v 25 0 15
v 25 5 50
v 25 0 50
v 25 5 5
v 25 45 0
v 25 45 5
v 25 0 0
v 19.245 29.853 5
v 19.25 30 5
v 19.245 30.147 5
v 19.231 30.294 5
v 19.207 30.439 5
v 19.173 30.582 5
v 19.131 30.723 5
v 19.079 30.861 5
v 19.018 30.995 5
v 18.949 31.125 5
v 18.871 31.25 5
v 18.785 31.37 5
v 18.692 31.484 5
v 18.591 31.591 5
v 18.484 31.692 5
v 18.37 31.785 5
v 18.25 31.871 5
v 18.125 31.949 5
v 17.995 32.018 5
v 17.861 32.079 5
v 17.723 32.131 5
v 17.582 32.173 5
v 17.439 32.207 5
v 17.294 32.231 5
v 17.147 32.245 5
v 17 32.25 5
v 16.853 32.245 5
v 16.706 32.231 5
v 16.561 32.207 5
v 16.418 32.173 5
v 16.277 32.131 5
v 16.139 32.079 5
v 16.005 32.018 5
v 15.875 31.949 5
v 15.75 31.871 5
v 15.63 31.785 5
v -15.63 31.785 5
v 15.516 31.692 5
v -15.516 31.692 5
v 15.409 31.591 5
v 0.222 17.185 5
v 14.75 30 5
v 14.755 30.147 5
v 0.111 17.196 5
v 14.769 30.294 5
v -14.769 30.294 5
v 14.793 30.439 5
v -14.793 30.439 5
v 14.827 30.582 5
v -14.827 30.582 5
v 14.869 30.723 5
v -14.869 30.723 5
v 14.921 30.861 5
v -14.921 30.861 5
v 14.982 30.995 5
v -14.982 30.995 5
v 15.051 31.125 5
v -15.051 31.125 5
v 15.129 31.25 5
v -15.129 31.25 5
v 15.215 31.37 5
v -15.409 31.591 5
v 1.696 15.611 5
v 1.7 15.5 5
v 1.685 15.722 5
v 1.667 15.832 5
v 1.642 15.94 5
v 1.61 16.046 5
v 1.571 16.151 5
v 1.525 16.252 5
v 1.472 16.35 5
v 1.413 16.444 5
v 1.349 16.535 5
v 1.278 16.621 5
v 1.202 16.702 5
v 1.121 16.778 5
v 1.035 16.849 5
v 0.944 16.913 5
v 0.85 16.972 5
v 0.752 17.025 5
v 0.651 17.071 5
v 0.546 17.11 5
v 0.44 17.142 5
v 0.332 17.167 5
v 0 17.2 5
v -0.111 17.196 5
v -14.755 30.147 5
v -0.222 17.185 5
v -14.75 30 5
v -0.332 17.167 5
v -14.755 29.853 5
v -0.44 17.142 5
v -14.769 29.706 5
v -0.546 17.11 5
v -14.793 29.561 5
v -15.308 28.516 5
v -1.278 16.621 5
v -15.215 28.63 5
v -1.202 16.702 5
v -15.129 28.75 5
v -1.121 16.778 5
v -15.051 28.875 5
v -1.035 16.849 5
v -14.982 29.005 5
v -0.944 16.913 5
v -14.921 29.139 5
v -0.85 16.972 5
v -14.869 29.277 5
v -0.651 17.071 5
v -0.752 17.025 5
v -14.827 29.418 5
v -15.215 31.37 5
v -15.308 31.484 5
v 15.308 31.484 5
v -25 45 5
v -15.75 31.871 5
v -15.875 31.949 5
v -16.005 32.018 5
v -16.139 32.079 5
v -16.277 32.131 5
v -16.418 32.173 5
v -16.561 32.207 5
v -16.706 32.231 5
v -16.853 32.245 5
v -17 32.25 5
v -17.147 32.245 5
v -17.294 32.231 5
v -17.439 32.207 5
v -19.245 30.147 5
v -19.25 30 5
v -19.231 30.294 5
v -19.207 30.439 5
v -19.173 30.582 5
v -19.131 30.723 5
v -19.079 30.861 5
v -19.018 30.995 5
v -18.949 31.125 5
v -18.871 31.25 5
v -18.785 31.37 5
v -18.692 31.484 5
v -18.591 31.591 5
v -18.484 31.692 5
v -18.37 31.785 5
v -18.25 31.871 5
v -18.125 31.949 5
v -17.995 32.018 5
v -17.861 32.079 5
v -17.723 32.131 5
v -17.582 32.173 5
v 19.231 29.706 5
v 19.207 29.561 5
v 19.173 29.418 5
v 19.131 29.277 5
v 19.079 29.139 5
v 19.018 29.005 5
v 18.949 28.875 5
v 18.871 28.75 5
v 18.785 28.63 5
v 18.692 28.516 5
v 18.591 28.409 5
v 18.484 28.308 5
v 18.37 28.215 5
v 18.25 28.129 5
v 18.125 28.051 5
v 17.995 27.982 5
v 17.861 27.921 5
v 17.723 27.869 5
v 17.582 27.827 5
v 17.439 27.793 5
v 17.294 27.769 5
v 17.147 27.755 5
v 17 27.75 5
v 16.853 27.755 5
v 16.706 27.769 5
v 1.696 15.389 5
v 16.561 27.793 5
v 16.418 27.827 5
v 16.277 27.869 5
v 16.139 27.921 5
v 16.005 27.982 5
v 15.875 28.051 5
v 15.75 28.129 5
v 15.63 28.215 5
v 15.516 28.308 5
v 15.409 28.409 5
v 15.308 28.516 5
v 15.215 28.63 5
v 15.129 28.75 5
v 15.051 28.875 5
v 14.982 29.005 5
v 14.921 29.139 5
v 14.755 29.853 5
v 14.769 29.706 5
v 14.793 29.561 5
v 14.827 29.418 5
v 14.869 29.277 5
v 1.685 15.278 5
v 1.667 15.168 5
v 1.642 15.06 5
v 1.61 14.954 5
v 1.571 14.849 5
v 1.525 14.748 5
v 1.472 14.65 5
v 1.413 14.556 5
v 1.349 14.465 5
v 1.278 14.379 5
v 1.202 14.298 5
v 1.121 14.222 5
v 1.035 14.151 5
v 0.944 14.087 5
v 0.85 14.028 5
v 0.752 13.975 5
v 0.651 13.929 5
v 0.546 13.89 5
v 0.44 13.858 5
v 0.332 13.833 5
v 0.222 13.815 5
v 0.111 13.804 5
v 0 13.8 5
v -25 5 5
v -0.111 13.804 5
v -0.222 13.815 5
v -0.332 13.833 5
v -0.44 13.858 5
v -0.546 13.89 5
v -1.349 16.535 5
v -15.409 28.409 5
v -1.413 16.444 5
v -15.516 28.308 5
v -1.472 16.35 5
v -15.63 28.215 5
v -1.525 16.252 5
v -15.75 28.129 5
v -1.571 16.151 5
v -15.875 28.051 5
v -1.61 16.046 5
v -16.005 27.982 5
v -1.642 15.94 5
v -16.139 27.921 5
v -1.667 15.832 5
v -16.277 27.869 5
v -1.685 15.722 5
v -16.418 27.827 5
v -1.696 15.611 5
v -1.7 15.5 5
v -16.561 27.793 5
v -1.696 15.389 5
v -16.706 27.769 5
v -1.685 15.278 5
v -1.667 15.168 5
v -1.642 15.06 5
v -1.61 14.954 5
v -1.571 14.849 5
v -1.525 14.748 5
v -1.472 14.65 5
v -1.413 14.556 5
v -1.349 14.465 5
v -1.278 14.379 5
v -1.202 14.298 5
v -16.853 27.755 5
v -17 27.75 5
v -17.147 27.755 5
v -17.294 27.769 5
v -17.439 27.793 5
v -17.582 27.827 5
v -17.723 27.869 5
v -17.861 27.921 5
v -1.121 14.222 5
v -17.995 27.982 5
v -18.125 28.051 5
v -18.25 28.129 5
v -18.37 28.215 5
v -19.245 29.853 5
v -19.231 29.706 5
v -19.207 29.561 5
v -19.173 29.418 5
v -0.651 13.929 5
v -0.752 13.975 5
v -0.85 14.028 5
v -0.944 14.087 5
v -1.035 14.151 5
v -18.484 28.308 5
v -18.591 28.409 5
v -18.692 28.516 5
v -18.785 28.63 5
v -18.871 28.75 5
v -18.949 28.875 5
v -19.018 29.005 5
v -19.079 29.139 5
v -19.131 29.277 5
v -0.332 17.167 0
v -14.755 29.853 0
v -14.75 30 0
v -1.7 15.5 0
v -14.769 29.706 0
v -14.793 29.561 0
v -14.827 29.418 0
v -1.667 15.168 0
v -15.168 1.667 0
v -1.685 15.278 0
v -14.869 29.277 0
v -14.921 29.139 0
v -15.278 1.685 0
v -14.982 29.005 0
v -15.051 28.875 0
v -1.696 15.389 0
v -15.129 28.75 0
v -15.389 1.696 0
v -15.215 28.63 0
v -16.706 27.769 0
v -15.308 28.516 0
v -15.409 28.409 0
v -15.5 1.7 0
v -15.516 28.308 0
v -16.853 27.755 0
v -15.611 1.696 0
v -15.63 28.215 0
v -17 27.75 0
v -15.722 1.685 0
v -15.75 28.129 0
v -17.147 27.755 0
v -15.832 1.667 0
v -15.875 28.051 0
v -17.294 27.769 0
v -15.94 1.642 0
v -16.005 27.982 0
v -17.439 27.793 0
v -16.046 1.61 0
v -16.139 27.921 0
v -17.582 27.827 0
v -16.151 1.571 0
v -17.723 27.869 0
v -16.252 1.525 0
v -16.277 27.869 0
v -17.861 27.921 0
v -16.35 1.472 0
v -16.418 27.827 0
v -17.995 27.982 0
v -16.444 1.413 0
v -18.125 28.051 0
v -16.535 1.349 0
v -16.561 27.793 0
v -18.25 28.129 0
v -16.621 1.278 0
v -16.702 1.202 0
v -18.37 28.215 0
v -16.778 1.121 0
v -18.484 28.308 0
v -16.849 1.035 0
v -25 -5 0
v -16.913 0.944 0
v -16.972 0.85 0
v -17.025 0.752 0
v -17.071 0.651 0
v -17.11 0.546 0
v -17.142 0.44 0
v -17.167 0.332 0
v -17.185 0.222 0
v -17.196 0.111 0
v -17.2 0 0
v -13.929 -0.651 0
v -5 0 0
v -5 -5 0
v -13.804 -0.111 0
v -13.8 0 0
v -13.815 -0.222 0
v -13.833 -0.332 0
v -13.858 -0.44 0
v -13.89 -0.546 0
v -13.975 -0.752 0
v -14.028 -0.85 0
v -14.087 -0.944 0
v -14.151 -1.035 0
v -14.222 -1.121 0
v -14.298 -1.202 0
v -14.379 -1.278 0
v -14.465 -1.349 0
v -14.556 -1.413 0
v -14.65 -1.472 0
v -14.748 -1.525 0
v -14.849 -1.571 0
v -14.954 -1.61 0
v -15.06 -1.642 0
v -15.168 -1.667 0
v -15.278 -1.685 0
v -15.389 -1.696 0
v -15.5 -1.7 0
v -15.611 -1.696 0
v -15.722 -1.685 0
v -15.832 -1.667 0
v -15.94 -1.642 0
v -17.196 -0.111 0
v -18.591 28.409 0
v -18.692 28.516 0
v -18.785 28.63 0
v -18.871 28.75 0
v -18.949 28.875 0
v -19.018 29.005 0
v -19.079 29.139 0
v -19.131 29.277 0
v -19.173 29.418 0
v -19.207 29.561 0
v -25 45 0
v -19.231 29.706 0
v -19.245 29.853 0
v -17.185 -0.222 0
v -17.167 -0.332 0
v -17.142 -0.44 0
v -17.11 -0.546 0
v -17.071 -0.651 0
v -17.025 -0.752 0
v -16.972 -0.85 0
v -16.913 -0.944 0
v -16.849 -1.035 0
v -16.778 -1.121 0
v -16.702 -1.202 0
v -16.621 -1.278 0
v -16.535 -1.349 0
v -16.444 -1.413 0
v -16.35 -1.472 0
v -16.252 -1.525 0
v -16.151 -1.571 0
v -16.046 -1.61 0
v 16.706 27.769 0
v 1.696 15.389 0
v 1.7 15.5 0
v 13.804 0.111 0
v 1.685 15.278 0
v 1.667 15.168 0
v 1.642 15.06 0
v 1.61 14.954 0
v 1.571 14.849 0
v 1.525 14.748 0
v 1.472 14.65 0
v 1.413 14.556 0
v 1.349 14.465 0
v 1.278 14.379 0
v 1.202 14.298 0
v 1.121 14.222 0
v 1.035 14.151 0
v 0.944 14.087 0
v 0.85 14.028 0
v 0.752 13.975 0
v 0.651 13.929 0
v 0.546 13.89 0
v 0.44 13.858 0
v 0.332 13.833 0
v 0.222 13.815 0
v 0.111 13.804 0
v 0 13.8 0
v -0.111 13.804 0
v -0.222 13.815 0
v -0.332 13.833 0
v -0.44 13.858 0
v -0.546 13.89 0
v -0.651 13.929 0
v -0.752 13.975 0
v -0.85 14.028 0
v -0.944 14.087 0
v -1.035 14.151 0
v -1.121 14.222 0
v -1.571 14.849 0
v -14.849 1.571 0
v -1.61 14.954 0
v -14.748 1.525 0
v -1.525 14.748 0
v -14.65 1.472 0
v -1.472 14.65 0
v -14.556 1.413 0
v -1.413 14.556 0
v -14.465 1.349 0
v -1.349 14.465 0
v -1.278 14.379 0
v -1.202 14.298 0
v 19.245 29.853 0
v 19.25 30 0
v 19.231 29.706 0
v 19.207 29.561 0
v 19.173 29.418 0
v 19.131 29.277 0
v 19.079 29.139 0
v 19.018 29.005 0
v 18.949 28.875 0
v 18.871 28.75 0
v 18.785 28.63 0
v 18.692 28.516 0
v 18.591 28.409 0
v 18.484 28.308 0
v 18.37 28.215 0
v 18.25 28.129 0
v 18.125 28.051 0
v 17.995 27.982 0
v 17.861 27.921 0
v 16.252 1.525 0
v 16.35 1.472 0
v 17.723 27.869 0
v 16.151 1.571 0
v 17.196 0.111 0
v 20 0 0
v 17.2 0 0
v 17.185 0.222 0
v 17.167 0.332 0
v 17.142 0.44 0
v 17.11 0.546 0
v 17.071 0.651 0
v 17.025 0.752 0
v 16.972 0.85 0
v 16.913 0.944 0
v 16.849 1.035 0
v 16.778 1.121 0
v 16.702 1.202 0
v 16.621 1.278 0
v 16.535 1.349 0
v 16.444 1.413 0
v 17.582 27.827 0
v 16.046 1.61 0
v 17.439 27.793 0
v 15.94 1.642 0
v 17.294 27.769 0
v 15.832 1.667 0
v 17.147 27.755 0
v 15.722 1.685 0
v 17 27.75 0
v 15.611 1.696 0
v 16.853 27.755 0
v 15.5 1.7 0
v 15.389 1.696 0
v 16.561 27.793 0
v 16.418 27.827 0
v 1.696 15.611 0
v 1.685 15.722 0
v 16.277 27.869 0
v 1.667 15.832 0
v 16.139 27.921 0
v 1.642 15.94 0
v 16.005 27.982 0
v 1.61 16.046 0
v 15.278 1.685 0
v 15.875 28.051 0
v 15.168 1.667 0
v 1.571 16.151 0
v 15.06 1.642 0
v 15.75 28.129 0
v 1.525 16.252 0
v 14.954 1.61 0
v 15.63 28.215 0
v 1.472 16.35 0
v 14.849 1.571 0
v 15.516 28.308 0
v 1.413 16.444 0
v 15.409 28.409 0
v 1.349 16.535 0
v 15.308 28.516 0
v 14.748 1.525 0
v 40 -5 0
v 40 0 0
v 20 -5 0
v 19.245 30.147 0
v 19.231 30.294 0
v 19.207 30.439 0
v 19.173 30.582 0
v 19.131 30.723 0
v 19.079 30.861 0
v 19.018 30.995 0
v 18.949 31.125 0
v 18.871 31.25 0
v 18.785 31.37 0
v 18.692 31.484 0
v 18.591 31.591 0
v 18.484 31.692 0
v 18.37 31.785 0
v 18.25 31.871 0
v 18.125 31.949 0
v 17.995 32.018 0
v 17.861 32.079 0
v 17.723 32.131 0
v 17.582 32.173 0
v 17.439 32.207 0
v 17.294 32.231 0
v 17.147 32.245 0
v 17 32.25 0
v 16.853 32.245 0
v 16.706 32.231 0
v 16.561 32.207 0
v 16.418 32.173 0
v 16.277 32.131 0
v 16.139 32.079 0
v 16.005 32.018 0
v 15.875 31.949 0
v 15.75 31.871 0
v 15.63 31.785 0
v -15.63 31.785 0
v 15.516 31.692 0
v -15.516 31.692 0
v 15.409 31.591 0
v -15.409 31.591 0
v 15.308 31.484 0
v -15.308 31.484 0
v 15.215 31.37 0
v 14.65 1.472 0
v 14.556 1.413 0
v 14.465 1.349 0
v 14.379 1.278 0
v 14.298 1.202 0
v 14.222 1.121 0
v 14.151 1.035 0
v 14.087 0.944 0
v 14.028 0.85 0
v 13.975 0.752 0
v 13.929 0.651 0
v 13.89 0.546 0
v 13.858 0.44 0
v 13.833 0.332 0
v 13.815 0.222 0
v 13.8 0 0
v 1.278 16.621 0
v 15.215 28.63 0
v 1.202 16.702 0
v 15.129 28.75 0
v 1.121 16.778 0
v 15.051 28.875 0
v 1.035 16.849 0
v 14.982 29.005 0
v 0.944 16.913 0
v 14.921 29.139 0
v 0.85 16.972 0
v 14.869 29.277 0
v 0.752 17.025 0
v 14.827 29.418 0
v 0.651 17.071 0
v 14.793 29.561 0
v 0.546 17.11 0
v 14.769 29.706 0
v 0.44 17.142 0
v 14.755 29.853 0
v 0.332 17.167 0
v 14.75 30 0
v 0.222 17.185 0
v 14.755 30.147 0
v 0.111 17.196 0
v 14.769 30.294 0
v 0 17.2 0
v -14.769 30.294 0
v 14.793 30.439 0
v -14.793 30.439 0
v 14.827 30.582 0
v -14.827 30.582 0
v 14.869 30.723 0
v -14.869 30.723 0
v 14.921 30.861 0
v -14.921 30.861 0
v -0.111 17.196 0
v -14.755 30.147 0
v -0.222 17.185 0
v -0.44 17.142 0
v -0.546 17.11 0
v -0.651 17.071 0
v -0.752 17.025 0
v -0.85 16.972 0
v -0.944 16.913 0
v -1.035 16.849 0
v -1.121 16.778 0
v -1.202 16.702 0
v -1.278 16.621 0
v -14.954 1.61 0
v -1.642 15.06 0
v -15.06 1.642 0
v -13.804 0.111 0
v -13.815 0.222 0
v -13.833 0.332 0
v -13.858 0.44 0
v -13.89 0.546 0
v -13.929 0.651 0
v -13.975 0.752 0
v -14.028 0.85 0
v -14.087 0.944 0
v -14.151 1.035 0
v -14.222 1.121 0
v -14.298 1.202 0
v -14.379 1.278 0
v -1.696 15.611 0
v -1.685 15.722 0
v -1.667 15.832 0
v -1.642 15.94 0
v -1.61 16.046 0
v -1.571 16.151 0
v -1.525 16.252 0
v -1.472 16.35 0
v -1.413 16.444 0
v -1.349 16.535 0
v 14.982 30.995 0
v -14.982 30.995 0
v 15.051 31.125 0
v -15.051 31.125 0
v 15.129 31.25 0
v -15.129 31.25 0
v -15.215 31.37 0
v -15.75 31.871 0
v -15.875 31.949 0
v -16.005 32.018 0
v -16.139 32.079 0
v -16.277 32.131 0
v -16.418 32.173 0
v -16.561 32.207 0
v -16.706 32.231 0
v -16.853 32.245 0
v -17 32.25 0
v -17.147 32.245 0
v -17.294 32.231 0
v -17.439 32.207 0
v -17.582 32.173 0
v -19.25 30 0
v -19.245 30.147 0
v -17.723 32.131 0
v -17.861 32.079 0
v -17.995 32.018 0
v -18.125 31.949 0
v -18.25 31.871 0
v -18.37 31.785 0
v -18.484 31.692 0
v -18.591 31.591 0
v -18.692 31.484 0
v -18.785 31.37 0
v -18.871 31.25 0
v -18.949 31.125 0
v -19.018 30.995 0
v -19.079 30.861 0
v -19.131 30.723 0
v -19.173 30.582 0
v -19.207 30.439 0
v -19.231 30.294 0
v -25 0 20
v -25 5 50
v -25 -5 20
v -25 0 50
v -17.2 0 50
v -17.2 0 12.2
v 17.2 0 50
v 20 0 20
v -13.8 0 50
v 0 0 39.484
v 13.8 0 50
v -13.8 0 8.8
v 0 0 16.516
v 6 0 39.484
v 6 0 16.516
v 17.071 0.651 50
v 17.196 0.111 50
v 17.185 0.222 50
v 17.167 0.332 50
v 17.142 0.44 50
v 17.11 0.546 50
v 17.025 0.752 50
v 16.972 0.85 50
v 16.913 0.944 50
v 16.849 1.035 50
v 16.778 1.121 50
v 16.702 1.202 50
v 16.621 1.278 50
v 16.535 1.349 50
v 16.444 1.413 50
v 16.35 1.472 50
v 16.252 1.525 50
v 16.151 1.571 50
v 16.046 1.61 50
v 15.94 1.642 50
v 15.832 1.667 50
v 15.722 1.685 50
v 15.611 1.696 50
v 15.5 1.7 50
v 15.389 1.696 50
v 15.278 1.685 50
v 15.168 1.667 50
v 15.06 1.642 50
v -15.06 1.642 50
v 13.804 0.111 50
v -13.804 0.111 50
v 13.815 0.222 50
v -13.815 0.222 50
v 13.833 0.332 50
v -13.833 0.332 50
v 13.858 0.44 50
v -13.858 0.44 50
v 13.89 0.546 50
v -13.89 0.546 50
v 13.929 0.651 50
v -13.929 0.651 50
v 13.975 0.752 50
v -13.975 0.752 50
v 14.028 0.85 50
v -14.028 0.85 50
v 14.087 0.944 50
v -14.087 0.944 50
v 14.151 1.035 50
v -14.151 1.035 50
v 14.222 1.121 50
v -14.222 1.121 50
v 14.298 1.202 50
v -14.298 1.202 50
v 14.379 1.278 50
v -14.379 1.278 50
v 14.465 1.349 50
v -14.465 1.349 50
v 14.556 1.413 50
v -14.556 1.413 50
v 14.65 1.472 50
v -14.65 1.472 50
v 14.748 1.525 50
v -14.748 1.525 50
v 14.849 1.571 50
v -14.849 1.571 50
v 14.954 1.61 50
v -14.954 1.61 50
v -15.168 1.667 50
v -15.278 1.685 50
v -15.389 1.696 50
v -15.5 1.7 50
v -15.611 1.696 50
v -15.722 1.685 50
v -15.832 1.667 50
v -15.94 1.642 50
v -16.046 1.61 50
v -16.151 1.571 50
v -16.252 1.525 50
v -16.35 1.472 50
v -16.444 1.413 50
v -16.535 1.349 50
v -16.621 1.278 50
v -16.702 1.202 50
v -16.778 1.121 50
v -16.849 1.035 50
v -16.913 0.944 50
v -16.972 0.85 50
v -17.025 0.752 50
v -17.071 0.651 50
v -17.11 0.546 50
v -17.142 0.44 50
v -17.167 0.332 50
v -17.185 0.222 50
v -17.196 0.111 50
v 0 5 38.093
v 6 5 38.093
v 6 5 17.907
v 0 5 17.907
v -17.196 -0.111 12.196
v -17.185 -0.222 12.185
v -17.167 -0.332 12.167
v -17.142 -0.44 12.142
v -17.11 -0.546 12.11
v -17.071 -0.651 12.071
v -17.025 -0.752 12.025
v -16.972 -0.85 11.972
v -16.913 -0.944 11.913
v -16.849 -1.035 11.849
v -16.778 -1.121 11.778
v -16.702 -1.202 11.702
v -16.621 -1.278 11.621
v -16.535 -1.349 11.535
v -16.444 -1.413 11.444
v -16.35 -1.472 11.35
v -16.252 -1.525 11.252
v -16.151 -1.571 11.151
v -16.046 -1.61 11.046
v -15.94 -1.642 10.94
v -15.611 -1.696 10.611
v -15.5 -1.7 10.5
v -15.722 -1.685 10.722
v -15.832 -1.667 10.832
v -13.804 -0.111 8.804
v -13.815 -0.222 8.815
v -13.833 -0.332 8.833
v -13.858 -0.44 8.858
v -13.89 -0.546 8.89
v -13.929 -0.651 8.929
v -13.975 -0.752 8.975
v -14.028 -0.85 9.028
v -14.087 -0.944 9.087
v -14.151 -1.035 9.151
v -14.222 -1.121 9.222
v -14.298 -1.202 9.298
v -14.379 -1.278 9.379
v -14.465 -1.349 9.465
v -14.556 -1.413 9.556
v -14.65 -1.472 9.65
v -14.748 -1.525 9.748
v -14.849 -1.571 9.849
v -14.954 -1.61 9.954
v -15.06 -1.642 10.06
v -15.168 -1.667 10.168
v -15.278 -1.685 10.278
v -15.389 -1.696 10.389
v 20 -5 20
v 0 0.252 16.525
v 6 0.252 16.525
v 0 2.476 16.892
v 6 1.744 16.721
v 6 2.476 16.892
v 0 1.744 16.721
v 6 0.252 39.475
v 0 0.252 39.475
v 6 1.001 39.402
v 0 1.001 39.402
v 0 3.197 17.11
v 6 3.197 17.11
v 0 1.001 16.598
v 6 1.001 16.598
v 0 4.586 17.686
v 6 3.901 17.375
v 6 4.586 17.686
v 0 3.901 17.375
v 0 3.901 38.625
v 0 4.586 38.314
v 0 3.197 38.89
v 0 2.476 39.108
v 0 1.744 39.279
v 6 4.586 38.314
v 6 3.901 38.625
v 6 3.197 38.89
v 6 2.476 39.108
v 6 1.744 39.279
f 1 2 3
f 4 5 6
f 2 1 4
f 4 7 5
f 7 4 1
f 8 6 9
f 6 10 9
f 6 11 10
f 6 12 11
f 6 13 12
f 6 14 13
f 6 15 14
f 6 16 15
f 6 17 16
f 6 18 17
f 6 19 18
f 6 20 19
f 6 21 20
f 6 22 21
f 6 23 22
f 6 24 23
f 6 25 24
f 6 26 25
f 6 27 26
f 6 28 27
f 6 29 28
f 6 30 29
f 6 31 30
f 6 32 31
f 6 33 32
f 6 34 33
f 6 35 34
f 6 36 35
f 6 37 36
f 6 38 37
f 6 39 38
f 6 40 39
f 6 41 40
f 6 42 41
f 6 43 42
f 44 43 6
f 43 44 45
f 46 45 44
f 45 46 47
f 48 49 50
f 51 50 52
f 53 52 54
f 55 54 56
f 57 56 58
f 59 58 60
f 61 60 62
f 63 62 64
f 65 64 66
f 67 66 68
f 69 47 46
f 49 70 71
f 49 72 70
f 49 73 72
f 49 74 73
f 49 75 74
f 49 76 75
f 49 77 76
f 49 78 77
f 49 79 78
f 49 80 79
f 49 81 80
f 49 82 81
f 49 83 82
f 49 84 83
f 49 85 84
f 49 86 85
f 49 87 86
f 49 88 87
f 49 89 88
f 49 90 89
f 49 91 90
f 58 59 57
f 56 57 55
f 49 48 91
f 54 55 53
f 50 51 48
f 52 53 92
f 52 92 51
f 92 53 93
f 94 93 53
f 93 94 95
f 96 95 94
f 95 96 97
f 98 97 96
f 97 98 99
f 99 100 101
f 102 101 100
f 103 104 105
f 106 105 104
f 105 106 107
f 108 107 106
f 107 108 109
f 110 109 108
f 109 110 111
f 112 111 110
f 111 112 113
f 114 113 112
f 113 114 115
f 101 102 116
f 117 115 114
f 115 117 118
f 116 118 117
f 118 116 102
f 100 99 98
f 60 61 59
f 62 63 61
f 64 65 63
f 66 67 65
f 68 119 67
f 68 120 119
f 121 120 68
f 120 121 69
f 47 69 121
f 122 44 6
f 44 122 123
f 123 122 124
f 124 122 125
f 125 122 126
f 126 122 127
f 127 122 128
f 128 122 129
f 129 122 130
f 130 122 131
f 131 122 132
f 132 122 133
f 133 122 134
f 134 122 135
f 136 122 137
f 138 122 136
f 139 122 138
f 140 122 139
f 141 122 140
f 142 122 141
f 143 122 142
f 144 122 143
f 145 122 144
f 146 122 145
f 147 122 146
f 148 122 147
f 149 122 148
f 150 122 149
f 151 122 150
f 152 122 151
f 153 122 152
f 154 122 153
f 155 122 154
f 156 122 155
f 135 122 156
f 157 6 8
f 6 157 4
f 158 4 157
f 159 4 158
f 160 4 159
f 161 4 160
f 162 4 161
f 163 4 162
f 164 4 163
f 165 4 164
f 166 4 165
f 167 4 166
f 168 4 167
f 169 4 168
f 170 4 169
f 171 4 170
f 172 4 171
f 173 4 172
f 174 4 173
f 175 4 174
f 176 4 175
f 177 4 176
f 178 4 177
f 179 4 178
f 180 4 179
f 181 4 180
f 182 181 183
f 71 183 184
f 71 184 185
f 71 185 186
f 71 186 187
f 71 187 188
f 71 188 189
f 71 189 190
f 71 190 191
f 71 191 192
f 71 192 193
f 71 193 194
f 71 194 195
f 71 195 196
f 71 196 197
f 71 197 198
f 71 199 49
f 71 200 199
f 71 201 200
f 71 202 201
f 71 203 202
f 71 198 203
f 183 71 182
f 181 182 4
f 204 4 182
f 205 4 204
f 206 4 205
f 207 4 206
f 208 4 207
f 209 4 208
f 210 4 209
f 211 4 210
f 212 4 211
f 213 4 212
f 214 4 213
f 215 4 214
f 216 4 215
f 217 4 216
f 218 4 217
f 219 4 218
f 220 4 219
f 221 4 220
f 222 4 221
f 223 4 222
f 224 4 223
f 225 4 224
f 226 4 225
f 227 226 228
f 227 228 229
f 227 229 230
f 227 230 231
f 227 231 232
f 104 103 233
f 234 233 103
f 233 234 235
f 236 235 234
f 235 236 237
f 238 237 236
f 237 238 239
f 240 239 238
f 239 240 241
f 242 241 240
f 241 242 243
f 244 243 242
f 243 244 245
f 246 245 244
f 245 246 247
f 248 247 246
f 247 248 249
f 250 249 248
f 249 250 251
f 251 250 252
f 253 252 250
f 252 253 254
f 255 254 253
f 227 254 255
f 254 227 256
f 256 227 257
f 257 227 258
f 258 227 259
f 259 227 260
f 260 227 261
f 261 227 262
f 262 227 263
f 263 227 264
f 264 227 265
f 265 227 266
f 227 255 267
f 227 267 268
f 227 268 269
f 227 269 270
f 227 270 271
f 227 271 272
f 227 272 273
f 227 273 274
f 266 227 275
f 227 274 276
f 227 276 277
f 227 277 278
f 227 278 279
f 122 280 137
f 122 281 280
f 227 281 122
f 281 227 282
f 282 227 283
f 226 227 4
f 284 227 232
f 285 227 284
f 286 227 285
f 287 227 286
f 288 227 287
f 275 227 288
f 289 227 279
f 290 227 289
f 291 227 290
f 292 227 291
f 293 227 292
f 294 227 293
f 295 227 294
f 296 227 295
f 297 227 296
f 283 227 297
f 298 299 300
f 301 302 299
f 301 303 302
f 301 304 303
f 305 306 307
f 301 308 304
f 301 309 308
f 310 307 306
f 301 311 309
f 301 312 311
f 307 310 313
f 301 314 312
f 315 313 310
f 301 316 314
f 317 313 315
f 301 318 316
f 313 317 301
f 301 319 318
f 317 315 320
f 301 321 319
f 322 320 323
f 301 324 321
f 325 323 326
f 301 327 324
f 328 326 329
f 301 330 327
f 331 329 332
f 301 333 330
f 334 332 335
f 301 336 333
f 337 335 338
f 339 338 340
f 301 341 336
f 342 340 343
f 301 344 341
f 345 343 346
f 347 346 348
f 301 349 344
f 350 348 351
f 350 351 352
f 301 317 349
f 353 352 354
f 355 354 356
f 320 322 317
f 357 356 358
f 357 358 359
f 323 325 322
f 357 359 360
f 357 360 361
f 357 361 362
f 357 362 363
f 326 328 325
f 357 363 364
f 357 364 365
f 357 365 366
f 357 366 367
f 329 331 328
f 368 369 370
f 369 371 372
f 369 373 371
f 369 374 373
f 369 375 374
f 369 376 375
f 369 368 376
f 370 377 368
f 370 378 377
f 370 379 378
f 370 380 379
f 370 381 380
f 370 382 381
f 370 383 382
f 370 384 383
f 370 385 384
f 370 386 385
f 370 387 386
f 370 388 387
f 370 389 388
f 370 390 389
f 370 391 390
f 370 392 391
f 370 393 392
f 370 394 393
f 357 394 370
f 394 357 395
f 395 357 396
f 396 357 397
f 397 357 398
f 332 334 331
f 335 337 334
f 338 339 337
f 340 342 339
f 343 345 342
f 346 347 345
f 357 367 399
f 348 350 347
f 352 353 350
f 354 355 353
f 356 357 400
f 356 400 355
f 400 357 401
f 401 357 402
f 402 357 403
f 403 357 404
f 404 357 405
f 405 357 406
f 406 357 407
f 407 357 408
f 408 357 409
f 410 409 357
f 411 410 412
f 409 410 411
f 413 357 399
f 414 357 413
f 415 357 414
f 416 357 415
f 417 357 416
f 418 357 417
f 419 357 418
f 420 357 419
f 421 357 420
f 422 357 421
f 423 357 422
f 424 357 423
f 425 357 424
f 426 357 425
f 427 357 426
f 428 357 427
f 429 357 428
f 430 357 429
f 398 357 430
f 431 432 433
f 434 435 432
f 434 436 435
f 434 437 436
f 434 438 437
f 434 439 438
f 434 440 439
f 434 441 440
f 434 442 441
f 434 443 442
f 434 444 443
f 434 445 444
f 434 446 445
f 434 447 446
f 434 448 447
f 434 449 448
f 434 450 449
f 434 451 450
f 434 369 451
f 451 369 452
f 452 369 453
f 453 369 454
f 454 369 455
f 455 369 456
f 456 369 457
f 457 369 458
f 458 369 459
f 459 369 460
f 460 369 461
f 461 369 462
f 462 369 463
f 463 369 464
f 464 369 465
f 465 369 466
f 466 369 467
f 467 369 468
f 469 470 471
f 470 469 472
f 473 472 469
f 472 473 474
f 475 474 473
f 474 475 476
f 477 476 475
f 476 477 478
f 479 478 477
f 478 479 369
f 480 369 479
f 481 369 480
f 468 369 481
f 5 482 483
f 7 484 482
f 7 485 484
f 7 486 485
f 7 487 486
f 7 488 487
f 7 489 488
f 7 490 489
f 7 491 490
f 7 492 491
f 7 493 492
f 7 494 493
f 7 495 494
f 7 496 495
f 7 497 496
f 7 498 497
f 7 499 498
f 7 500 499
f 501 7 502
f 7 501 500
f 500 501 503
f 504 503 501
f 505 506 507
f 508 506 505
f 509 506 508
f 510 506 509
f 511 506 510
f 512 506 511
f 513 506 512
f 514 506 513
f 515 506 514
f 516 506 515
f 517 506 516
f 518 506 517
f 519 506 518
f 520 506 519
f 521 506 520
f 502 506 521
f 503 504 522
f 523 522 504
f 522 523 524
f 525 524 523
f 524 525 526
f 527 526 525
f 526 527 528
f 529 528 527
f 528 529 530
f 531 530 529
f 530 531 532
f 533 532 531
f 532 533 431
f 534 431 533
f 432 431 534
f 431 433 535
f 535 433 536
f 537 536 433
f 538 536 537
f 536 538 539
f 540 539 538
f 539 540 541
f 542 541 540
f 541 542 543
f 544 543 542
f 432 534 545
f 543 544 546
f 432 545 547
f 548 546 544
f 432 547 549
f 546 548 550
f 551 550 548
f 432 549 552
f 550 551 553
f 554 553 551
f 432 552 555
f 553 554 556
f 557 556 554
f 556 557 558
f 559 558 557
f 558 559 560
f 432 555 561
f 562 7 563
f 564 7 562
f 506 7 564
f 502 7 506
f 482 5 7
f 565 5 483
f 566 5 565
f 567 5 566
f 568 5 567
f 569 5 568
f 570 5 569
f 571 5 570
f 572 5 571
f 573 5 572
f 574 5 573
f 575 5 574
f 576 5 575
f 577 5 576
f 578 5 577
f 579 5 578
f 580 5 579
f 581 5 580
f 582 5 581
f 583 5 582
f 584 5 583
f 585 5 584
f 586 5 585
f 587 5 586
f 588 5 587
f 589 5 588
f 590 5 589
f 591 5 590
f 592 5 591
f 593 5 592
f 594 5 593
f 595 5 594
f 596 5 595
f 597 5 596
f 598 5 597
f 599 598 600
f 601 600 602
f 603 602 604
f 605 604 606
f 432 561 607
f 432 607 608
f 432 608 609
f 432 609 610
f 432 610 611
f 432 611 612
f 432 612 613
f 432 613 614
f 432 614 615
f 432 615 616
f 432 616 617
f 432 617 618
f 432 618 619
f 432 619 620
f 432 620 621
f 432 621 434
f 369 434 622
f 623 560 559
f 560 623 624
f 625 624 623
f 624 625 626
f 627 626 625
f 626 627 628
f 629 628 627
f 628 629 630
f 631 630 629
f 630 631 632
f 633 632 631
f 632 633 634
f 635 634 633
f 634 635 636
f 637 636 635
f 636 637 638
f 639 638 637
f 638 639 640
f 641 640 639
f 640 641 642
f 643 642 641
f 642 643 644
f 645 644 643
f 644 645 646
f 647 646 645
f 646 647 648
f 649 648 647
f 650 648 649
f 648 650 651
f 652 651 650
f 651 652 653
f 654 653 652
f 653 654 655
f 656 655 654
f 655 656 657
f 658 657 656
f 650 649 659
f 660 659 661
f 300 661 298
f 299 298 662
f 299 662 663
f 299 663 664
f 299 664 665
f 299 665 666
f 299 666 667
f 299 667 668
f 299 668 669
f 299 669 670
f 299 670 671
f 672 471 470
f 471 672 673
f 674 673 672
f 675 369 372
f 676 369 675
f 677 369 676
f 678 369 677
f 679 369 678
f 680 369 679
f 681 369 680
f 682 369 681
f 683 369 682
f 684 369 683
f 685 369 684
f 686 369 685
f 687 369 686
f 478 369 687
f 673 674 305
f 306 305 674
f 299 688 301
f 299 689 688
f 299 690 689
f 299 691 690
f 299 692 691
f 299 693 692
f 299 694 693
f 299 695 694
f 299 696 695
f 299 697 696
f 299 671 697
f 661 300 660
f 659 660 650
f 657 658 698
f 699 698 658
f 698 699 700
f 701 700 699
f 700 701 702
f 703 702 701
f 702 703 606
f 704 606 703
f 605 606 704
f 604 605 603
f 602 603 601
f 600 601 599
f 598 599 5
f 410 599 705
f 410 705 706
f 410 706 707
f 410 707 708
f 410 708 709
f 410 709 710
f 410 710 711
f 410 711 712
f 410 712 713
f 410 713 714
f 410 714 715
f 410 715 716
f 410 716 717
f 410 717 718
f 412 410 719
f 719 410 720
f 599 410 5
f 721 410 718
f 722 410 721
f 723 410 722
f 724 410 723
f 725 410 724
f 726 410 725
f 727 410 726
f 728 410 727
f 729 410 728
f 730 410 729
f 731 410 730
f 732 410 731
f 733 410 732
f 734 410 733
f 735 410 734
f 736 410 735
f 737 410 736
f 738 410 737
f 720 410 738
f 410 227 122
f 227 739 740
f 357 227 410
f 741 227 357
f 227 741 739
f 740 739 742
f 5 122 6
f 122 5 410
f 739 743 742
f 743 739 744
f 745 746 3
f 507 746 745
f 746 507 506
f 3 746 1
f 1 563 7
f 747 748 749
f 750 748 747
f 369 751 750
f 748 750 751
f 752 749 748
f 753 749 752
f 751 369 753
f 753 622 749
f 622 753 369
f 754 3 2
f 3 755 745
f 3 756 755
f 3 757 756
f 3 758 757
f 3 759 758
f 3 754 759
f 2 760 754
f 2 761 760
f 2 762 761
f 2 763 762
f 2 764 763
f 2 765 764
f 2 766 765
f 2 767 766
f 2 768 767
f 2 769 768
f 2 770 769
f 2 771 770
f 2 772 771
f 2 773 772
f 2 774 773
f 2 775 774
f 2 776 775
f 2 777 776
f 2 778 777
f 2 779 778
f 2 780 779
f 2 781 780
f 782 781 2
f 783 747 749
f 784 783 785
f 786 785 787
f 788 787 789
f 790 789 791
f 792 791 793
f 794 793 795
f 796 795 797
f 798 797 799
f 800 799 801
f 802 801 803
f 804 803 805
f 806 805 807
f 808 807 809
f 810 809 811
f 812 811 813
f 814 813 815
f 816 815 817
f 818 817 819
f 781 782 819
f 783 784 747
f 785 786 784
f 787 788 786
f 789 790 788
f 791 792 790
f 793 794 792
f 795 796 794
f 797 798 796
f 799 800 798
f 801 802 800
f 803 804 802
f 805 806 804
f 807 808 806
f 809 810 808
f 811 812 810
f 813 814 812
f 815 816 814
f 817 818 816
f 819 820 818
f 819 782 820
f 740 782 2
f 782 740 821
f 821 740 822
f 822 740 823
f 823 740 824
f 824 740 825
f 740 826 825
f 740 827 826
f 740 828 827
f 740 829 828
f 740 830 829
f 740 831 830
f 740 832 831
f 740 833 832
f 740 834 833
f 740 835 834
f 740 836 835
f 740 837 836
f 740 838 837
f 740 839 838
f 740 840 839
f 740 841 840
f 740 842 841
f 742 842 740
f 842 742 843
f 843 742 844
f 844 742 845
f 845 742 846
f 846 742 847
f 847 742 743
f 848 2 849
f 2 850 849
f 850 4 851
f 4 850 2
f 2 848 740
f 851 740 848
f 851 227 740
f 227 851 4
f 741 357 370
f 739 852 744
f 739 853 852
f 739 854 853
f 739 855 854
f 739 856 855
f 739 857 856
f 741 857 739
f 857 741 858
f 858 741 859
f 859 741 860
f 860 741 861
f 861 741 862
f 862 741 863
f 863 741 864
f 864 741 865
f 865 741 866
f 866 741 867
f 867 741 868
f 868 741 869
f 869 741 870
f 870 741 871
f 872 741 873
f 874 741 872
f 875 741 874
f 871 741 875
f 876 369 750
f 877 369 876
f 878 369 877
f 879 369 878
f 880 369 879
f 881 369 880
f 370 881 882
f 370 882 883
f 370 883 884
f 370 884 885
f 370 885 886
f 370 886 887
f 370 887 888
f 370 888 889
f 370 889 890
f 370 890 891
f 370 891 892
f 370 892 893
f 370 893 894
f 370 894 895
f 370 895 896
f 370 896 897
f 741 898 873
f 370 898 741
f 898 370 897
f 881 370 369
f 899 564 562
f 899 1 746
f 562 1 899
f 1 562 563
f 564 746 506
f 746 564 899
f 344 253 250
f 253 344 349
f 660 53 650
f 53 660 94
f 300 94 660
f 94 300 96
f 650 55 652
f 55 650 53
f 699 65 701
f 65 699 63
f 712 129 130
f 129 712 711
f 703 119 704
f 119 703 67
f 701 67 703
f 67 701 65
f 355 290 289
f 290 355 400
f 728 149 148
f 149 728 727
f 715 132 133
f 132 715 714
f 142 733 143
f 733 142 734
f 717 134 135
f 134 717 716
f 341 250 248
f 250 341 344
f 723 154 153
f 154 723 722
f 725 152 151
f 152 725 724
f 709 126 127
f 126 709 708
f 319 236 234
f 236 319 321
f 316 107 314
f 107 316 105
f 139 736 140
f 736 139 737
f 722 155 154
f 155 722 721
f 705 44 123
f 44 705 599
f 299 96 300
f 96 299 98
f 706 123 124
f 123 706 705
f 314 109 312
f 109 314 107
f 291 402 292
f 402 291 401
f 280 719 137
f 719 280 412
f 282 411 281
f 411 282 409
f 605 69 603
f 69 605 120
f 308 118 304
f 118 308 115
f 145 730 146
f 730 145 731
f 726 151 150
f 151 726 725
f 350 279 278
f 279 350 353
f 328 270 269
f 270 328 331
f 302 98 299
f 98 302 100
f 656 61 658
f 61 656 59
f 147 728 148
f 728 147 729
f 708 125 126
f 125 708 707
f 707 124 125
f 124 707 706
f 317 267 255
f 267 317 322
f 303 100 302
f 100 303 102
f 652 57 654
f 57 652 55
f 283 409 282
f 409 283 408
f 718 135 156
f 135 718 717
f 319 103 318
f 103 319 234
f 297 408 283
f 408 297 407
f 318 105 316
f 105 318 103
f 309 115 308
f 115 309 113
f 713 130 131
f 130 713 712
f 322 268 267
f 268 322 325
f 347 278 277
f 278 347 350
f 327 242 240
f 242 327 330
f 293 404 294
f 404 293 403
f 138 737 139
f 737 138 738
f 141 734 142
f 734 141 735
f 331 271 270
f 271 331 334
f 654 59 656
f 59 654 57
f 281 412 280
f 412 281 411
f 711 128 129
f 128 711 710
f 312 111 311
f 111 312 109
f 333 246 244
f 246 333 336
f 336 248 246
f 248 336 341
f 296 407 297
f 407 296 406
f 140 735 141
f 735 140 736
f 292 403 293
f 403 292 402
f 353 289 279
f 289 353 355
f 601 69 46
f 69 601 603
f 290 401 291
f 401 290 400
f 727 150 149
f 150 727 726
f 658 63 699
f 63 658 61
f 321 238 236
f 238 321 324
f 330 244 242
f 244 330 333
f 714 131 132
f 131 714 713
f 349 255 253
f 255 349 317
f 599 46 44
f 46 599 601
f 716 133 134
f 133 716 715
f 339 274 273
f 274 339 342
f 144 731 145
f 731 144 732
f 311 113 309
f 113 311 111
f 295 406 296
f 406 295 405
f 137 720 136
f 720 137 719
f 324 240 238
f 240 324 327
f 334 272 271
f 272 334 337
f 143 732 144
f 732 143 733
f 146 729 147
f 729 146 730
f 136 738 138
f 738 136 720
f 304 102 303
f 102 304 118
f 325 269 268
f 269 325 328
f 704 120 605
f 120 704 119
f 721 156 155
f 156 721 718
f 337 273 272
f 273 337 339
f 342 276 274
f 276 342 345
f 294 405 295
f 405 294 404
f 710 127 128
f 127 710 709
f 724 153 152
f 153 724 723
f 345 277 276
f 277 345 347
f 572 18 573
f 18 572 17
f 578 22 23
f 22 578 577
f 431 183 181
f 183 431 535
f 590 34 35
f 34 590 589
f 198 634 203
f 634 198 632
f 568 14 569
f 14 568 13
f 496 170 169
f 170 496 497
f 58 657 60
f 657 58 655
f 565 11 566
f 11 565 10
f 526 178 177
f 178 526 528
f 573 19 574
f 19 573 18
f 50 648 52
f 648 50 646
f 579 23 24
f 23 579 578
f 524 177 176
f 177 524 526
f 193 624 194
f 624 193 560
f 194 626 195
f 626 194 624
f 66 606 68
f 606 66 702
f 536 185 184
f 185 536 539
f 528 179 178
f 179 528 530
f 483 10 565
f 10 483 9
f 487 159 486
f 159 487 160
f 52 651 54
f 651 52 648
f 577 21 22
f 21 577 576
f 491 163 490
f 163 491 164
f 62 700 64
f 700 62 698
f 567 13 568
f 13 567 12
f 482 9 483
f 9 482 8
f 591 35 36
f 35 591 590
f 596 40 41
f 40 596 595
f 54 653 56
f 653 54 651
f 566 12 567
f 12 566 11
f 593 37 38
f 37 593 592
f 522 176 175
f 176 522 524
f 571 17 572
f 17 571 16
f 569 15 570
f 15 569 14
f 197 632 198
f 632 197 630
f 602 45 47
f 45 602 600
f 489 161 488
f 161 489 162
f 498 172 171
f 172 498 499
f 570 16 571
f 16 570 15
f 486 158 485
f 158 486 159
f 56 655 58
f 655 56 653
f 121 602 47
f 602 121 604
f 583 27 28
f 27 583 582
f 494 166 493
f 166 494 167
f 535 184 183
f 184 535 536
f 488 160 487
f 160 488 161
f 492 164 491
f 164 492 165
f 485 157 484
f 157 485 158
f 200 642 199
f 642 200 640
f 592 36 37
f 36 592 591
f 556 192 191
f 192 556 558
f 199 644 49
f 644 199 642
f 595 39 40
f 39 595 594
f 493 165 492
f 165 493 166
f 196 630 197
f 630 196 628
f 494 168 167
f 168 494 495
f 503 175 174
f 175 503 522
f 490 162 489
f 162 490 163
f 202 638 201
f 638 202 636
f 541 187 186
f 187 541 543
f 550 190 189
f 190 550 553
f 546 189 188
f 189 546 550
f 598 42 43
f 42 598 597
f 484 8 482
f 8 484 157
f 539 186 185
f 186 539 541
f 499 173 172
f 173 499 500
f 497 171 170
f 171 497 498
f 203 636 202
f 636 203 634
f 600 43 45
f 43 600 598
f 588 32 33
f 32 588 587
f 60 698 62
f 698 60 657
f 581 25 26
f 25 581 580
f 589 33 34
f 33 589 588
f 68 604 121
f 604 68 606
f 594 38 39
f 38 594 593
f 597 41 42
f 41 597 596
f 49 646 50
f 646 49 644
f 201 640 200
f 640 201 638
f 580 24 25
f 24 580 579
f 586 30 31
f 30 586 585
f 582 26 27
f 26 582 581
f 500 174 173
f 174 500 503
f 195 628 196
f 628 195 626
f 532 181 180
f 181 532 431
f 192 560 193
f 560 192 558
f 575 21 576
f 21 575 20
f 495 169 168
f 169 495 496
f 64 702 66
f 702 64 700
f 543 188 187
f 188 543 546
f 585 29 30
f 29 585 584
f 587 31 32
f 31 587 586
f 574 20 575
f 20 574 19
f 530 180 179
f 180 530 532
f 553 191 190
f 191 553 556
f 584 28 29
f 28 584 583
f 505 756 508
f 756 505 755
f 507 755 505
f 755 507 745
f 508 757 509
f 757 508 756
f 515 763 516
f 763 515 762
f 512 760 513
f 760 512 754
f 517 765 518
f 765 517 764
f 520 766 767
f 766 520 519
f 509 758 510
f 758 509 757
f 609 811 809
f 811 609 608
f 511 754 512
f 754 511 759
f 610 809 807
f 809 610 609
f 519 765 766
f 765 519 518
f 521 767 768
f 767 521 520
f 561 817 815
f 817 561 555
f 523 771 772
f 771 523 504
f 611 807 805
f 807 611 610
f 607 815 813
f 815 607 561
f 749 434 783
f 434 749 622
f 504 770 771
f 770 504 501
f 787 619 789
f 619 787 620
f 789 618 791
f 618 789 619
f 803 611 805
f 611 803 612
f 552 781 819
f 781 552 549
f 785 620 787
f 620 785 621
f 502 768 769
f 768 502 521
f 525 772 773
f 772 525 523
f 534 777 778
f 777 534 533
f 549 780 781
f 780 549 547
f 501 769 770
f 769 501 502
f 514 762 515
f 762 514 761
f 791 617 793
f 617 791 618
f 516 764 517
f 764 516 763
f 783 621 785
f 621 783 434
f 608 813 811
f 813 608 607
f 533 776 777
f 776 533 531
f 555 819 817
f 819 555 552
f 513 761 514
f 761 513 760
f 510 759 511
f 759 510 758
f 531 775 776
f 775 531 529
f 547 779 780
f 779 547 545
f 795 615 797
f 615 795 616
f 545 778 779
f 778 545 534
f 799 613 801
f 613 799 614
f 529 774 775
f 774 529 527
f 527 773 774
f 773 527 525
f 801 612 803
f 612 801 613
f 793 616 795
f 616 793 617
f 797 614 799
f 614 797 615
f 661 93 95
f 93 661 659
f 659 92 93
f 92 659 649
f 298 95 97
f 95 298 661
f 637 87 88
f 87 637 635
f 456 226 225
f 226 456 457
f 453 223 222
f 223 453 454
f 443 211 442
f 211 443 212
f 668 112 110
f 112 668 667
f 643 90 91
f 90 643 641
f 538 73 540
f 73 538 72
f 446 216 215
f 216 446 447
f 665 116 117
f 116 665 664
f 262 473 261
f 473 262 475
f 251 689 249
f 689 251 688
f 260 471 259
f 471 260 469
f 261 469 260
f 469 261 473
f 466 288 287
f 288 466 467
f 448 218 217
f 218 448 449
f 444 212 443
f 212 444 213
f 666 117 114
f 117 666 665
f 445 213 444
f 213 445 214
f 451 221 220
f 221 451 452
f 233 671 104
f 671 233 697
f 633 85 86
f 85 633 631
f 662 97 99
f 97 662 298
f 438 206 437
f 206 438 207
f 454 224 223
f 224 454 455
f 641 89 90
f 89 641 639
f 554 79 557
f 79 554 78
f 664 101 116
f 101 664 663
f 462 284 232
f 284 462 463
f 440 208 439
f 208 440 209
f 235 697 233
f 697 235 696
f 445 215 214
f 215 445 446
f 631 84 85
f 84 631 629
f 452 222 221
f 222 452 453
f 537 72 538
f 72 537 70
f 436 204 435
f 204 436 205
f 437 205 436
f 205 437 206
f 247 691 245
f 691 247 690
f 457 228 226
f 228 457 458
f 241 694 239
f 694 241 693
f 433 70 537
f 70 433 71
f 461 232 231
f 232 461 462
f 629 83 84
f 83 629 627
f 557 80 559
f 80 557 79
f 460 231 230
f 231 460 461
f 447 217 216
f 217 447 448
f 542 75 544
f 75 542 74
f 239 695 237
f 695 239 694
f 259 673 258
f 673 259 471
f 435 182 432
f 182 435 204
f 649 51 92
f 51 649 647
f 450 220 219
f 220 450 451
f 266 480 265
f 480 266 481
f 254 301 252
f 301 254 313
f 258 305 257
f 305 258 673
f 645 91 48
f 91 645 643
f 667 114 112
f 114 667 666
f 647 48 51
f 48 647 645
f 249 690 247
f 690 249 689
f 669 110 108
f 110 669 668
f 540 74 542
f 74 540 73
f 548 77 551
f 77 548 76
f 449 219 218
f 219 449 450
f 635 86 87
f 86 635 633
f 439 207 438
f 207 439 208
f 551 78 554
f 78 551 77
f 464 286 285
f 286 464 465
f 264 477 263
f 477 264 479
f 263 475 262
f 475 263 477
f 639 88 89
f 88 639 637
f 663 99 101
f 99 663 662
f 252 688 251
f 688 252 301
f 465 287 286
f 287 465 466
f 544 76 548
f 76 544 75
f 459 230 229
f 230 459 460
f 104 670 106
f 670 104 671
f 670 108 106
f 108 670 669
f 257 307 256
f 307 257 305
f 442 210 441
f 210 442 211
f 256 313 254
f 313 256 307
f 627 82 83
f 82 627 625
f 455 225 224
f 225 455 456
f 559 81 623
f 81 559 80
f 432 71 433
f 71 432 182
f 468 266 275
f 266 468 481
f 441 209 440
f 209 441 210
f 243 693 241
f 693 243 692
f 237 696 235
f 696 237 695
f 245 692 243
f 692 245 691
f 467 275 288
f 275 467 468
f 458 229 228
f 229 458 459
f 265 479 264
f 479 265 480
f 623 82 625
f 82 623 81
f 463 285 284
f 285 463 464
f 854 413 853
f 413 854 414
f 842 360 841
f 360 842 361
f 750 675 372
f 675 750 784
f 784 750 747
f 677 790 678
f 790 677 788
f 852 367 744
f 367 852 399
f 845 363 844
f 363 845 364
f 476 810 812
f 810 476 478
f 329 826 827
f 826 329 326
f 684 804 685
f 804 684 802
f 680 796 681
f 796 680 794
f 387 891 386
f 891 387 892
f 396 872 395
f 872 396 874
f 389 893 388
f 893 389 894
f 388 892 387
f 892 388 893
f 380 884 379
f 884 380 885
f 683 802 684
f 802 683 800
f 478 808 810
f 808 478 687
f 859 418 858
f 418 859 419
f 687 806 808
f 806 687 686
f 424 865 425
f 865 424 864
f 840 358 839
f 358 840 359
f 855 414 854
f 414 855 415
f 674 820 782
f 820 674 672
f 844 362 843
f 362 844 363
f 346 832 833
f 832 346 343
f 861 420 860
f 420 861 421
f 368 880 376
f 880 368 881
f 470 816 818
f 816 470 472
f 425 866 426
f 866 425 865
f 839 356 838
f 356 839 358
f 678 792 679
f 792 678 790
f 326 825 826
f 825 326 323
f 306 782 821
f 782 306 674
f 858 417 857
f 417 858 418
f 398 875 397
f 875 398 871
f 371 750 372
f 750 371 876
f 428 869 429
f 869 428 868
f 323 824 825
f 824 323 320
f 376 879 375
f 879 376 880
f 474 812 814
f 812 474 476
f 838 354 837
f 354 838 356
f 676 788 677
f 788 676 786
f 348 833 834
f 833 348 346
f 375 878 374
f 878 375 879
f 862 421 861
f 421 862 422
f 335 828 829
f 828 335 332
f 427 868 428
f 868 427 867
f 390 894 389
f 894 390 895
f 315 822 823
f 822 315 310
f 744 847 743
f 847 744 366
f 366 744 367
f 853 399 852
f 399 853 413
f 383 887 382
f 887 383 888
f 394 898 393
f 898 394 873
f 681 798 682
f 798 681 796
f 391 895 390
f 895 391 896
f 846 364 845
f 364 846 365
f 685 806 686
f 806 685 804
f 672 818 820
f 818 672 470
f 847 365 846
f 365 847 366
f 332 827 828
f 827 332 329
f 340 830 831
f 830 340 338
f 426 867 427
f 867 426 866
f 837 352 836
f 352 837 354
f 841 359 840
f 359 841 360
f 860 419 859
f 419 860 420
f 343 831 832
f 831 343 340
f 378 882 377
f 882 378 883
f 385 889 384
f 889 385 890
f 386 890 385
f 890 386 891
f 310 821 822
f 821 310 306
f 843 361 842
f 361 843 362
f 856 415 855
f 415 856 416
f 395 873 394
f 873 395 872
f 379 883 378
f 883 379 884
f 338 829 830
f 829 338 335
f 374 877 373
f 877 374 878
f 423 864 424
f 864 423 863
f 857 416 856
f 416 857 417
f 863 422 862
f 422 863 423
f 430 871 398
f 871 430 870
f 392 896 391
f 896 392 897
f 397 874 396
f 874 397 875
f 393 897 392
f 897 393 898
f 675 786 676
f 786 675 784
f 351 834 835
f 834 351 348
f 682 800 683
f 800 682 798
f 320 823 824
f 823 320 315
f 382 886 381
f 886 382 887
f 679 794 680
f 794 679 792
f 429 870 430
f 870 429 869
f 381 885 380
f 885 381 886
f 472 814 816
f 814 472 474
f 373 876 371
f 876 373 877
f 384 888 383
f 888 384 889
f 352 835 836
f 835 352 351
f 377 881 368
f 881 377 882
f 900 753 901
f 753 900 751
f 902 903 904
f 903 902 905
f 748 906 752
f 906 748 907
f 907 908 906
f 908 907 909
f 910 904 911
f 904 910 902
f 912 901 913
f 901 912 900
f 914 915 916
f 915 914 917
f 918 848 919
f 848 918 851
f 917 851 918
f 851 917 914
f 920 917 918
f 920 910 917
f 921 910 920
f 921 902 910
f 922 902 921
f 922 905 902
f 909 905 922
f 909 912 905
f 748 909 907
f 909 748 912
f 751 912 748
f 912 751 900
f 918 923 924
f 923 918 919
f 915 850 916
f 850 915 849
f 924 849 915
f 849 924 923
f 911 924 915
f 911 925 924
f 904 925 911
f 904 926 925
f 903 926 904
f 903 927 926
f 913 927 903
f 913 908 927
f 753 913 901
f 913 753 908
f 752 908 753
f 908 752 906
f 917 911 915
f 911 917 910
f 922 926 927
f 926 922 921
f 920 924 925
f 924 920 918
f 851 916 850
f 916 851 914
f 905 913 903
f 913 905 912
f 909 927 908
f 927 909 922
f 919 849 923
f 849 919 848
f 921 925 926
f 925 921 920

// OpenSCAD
// L-shaped mounting bracket for NEMA 17 stepper motor
// Print orientation: base plate on bed (z = 0), vertical plate builds upward

// ---------- Parameters ----------
base_x0      = -25;   // base plate x start
base_x1      = 25;    // base plate x end
base_y0      = 0;     // base plate y start
base_y1      = 45;    // base plate y end
base_z       = 5;     // base plate thickness

motor_x0     = -25;   // motor plate x start
motor_x1     = 25;    // motor plate x end
motor_y0     = 0;     // motor plate y start
motor_y1     = 5;     // motor plate y end
motor_z      = 50;    // motor plate height

hole_m4_x1   = -17;   // M4 through-hole x position 1
hole_m4_y1   = 30;    // M4 through-hole y position 1
hole_m4_x2   = 17;    // M4 through-hole x position 2
hole_m4_y2   = 30;    // M4 through-hole y position 2
hole_m4      = 4.5;   // M4 hole diameter

boss_d       = 23;    // motor centring boss hole diameter
boss_x       = 0;     // boss hole centre x
boss_z       = 28;    // boss hole centre z

screw_d      = 3.4;   // M3 screw hole diameter
screw_pitch  = 31;    // square pattern side length

gusset_t     = 5;     // gusset thickness (along X)
gusset_leg   = 20;    // right triangle leg length (Y and Z)

eps          = 0.5;   // cutter overshoot past faces

$fn = 96;

// ---------- Model ----------
difference() {
    union() {
        // Base plate
        translate([base_x0, base_y0, 0])
            cube([base_x1 - base_x0, base_y1 - base_y0, base_z]);

        // Vertical motor plate
        translate([motor_x0, motor_y0, 0])
            cube([motor_x1 - motor_x0, motor_y1 - motor_y0, motor_z]);

        // Left triangular gusset (x = -25 to -20)
        translate([-25, 0, 0])
            rotate([90, 0, 0])
                linear_extrude(height = gusset_t)
                    polygon([[0, 0], [gusset_leg, 0], [0, gusset_leg]]);

        // Right triangular gusset (x = 20 to 25)
        translate([20, 0, 0])
            rotate([90, 0, 0])
                linear_extrude(height = gusset_t)
                    polygon([[0, 0], [gusset_leg, 0], [0, gusset_leg]]);
    }

    // M4 through-holes
    for (i = [1, 2])
        translate([i == 1 ? hole_m4_x1 : hole_m4_x2,
                   i == 1 ? hole_m4_y1 : hole_m4_y2,
                   -eps])
            cylinder(d = hole_m4, h = base_z + motor_z + 2 * eps);

    // Motor boss hole
    translate([boss_x, motor_y0 - eps, boss_z])
        rotate([0, 90, 0])
            cylinder(d = boss_d, h = motor_y1 - motor_y0 + 2 * eps);

    // M3 screw holes on square pattern
    for (a = [0, 90, 180, 270])
        rotate([0, 0, a])
            translate([screw_pitch / 2, 0, 0])
                cylinder(d = screw_d, h = motor_z + eps);
}
